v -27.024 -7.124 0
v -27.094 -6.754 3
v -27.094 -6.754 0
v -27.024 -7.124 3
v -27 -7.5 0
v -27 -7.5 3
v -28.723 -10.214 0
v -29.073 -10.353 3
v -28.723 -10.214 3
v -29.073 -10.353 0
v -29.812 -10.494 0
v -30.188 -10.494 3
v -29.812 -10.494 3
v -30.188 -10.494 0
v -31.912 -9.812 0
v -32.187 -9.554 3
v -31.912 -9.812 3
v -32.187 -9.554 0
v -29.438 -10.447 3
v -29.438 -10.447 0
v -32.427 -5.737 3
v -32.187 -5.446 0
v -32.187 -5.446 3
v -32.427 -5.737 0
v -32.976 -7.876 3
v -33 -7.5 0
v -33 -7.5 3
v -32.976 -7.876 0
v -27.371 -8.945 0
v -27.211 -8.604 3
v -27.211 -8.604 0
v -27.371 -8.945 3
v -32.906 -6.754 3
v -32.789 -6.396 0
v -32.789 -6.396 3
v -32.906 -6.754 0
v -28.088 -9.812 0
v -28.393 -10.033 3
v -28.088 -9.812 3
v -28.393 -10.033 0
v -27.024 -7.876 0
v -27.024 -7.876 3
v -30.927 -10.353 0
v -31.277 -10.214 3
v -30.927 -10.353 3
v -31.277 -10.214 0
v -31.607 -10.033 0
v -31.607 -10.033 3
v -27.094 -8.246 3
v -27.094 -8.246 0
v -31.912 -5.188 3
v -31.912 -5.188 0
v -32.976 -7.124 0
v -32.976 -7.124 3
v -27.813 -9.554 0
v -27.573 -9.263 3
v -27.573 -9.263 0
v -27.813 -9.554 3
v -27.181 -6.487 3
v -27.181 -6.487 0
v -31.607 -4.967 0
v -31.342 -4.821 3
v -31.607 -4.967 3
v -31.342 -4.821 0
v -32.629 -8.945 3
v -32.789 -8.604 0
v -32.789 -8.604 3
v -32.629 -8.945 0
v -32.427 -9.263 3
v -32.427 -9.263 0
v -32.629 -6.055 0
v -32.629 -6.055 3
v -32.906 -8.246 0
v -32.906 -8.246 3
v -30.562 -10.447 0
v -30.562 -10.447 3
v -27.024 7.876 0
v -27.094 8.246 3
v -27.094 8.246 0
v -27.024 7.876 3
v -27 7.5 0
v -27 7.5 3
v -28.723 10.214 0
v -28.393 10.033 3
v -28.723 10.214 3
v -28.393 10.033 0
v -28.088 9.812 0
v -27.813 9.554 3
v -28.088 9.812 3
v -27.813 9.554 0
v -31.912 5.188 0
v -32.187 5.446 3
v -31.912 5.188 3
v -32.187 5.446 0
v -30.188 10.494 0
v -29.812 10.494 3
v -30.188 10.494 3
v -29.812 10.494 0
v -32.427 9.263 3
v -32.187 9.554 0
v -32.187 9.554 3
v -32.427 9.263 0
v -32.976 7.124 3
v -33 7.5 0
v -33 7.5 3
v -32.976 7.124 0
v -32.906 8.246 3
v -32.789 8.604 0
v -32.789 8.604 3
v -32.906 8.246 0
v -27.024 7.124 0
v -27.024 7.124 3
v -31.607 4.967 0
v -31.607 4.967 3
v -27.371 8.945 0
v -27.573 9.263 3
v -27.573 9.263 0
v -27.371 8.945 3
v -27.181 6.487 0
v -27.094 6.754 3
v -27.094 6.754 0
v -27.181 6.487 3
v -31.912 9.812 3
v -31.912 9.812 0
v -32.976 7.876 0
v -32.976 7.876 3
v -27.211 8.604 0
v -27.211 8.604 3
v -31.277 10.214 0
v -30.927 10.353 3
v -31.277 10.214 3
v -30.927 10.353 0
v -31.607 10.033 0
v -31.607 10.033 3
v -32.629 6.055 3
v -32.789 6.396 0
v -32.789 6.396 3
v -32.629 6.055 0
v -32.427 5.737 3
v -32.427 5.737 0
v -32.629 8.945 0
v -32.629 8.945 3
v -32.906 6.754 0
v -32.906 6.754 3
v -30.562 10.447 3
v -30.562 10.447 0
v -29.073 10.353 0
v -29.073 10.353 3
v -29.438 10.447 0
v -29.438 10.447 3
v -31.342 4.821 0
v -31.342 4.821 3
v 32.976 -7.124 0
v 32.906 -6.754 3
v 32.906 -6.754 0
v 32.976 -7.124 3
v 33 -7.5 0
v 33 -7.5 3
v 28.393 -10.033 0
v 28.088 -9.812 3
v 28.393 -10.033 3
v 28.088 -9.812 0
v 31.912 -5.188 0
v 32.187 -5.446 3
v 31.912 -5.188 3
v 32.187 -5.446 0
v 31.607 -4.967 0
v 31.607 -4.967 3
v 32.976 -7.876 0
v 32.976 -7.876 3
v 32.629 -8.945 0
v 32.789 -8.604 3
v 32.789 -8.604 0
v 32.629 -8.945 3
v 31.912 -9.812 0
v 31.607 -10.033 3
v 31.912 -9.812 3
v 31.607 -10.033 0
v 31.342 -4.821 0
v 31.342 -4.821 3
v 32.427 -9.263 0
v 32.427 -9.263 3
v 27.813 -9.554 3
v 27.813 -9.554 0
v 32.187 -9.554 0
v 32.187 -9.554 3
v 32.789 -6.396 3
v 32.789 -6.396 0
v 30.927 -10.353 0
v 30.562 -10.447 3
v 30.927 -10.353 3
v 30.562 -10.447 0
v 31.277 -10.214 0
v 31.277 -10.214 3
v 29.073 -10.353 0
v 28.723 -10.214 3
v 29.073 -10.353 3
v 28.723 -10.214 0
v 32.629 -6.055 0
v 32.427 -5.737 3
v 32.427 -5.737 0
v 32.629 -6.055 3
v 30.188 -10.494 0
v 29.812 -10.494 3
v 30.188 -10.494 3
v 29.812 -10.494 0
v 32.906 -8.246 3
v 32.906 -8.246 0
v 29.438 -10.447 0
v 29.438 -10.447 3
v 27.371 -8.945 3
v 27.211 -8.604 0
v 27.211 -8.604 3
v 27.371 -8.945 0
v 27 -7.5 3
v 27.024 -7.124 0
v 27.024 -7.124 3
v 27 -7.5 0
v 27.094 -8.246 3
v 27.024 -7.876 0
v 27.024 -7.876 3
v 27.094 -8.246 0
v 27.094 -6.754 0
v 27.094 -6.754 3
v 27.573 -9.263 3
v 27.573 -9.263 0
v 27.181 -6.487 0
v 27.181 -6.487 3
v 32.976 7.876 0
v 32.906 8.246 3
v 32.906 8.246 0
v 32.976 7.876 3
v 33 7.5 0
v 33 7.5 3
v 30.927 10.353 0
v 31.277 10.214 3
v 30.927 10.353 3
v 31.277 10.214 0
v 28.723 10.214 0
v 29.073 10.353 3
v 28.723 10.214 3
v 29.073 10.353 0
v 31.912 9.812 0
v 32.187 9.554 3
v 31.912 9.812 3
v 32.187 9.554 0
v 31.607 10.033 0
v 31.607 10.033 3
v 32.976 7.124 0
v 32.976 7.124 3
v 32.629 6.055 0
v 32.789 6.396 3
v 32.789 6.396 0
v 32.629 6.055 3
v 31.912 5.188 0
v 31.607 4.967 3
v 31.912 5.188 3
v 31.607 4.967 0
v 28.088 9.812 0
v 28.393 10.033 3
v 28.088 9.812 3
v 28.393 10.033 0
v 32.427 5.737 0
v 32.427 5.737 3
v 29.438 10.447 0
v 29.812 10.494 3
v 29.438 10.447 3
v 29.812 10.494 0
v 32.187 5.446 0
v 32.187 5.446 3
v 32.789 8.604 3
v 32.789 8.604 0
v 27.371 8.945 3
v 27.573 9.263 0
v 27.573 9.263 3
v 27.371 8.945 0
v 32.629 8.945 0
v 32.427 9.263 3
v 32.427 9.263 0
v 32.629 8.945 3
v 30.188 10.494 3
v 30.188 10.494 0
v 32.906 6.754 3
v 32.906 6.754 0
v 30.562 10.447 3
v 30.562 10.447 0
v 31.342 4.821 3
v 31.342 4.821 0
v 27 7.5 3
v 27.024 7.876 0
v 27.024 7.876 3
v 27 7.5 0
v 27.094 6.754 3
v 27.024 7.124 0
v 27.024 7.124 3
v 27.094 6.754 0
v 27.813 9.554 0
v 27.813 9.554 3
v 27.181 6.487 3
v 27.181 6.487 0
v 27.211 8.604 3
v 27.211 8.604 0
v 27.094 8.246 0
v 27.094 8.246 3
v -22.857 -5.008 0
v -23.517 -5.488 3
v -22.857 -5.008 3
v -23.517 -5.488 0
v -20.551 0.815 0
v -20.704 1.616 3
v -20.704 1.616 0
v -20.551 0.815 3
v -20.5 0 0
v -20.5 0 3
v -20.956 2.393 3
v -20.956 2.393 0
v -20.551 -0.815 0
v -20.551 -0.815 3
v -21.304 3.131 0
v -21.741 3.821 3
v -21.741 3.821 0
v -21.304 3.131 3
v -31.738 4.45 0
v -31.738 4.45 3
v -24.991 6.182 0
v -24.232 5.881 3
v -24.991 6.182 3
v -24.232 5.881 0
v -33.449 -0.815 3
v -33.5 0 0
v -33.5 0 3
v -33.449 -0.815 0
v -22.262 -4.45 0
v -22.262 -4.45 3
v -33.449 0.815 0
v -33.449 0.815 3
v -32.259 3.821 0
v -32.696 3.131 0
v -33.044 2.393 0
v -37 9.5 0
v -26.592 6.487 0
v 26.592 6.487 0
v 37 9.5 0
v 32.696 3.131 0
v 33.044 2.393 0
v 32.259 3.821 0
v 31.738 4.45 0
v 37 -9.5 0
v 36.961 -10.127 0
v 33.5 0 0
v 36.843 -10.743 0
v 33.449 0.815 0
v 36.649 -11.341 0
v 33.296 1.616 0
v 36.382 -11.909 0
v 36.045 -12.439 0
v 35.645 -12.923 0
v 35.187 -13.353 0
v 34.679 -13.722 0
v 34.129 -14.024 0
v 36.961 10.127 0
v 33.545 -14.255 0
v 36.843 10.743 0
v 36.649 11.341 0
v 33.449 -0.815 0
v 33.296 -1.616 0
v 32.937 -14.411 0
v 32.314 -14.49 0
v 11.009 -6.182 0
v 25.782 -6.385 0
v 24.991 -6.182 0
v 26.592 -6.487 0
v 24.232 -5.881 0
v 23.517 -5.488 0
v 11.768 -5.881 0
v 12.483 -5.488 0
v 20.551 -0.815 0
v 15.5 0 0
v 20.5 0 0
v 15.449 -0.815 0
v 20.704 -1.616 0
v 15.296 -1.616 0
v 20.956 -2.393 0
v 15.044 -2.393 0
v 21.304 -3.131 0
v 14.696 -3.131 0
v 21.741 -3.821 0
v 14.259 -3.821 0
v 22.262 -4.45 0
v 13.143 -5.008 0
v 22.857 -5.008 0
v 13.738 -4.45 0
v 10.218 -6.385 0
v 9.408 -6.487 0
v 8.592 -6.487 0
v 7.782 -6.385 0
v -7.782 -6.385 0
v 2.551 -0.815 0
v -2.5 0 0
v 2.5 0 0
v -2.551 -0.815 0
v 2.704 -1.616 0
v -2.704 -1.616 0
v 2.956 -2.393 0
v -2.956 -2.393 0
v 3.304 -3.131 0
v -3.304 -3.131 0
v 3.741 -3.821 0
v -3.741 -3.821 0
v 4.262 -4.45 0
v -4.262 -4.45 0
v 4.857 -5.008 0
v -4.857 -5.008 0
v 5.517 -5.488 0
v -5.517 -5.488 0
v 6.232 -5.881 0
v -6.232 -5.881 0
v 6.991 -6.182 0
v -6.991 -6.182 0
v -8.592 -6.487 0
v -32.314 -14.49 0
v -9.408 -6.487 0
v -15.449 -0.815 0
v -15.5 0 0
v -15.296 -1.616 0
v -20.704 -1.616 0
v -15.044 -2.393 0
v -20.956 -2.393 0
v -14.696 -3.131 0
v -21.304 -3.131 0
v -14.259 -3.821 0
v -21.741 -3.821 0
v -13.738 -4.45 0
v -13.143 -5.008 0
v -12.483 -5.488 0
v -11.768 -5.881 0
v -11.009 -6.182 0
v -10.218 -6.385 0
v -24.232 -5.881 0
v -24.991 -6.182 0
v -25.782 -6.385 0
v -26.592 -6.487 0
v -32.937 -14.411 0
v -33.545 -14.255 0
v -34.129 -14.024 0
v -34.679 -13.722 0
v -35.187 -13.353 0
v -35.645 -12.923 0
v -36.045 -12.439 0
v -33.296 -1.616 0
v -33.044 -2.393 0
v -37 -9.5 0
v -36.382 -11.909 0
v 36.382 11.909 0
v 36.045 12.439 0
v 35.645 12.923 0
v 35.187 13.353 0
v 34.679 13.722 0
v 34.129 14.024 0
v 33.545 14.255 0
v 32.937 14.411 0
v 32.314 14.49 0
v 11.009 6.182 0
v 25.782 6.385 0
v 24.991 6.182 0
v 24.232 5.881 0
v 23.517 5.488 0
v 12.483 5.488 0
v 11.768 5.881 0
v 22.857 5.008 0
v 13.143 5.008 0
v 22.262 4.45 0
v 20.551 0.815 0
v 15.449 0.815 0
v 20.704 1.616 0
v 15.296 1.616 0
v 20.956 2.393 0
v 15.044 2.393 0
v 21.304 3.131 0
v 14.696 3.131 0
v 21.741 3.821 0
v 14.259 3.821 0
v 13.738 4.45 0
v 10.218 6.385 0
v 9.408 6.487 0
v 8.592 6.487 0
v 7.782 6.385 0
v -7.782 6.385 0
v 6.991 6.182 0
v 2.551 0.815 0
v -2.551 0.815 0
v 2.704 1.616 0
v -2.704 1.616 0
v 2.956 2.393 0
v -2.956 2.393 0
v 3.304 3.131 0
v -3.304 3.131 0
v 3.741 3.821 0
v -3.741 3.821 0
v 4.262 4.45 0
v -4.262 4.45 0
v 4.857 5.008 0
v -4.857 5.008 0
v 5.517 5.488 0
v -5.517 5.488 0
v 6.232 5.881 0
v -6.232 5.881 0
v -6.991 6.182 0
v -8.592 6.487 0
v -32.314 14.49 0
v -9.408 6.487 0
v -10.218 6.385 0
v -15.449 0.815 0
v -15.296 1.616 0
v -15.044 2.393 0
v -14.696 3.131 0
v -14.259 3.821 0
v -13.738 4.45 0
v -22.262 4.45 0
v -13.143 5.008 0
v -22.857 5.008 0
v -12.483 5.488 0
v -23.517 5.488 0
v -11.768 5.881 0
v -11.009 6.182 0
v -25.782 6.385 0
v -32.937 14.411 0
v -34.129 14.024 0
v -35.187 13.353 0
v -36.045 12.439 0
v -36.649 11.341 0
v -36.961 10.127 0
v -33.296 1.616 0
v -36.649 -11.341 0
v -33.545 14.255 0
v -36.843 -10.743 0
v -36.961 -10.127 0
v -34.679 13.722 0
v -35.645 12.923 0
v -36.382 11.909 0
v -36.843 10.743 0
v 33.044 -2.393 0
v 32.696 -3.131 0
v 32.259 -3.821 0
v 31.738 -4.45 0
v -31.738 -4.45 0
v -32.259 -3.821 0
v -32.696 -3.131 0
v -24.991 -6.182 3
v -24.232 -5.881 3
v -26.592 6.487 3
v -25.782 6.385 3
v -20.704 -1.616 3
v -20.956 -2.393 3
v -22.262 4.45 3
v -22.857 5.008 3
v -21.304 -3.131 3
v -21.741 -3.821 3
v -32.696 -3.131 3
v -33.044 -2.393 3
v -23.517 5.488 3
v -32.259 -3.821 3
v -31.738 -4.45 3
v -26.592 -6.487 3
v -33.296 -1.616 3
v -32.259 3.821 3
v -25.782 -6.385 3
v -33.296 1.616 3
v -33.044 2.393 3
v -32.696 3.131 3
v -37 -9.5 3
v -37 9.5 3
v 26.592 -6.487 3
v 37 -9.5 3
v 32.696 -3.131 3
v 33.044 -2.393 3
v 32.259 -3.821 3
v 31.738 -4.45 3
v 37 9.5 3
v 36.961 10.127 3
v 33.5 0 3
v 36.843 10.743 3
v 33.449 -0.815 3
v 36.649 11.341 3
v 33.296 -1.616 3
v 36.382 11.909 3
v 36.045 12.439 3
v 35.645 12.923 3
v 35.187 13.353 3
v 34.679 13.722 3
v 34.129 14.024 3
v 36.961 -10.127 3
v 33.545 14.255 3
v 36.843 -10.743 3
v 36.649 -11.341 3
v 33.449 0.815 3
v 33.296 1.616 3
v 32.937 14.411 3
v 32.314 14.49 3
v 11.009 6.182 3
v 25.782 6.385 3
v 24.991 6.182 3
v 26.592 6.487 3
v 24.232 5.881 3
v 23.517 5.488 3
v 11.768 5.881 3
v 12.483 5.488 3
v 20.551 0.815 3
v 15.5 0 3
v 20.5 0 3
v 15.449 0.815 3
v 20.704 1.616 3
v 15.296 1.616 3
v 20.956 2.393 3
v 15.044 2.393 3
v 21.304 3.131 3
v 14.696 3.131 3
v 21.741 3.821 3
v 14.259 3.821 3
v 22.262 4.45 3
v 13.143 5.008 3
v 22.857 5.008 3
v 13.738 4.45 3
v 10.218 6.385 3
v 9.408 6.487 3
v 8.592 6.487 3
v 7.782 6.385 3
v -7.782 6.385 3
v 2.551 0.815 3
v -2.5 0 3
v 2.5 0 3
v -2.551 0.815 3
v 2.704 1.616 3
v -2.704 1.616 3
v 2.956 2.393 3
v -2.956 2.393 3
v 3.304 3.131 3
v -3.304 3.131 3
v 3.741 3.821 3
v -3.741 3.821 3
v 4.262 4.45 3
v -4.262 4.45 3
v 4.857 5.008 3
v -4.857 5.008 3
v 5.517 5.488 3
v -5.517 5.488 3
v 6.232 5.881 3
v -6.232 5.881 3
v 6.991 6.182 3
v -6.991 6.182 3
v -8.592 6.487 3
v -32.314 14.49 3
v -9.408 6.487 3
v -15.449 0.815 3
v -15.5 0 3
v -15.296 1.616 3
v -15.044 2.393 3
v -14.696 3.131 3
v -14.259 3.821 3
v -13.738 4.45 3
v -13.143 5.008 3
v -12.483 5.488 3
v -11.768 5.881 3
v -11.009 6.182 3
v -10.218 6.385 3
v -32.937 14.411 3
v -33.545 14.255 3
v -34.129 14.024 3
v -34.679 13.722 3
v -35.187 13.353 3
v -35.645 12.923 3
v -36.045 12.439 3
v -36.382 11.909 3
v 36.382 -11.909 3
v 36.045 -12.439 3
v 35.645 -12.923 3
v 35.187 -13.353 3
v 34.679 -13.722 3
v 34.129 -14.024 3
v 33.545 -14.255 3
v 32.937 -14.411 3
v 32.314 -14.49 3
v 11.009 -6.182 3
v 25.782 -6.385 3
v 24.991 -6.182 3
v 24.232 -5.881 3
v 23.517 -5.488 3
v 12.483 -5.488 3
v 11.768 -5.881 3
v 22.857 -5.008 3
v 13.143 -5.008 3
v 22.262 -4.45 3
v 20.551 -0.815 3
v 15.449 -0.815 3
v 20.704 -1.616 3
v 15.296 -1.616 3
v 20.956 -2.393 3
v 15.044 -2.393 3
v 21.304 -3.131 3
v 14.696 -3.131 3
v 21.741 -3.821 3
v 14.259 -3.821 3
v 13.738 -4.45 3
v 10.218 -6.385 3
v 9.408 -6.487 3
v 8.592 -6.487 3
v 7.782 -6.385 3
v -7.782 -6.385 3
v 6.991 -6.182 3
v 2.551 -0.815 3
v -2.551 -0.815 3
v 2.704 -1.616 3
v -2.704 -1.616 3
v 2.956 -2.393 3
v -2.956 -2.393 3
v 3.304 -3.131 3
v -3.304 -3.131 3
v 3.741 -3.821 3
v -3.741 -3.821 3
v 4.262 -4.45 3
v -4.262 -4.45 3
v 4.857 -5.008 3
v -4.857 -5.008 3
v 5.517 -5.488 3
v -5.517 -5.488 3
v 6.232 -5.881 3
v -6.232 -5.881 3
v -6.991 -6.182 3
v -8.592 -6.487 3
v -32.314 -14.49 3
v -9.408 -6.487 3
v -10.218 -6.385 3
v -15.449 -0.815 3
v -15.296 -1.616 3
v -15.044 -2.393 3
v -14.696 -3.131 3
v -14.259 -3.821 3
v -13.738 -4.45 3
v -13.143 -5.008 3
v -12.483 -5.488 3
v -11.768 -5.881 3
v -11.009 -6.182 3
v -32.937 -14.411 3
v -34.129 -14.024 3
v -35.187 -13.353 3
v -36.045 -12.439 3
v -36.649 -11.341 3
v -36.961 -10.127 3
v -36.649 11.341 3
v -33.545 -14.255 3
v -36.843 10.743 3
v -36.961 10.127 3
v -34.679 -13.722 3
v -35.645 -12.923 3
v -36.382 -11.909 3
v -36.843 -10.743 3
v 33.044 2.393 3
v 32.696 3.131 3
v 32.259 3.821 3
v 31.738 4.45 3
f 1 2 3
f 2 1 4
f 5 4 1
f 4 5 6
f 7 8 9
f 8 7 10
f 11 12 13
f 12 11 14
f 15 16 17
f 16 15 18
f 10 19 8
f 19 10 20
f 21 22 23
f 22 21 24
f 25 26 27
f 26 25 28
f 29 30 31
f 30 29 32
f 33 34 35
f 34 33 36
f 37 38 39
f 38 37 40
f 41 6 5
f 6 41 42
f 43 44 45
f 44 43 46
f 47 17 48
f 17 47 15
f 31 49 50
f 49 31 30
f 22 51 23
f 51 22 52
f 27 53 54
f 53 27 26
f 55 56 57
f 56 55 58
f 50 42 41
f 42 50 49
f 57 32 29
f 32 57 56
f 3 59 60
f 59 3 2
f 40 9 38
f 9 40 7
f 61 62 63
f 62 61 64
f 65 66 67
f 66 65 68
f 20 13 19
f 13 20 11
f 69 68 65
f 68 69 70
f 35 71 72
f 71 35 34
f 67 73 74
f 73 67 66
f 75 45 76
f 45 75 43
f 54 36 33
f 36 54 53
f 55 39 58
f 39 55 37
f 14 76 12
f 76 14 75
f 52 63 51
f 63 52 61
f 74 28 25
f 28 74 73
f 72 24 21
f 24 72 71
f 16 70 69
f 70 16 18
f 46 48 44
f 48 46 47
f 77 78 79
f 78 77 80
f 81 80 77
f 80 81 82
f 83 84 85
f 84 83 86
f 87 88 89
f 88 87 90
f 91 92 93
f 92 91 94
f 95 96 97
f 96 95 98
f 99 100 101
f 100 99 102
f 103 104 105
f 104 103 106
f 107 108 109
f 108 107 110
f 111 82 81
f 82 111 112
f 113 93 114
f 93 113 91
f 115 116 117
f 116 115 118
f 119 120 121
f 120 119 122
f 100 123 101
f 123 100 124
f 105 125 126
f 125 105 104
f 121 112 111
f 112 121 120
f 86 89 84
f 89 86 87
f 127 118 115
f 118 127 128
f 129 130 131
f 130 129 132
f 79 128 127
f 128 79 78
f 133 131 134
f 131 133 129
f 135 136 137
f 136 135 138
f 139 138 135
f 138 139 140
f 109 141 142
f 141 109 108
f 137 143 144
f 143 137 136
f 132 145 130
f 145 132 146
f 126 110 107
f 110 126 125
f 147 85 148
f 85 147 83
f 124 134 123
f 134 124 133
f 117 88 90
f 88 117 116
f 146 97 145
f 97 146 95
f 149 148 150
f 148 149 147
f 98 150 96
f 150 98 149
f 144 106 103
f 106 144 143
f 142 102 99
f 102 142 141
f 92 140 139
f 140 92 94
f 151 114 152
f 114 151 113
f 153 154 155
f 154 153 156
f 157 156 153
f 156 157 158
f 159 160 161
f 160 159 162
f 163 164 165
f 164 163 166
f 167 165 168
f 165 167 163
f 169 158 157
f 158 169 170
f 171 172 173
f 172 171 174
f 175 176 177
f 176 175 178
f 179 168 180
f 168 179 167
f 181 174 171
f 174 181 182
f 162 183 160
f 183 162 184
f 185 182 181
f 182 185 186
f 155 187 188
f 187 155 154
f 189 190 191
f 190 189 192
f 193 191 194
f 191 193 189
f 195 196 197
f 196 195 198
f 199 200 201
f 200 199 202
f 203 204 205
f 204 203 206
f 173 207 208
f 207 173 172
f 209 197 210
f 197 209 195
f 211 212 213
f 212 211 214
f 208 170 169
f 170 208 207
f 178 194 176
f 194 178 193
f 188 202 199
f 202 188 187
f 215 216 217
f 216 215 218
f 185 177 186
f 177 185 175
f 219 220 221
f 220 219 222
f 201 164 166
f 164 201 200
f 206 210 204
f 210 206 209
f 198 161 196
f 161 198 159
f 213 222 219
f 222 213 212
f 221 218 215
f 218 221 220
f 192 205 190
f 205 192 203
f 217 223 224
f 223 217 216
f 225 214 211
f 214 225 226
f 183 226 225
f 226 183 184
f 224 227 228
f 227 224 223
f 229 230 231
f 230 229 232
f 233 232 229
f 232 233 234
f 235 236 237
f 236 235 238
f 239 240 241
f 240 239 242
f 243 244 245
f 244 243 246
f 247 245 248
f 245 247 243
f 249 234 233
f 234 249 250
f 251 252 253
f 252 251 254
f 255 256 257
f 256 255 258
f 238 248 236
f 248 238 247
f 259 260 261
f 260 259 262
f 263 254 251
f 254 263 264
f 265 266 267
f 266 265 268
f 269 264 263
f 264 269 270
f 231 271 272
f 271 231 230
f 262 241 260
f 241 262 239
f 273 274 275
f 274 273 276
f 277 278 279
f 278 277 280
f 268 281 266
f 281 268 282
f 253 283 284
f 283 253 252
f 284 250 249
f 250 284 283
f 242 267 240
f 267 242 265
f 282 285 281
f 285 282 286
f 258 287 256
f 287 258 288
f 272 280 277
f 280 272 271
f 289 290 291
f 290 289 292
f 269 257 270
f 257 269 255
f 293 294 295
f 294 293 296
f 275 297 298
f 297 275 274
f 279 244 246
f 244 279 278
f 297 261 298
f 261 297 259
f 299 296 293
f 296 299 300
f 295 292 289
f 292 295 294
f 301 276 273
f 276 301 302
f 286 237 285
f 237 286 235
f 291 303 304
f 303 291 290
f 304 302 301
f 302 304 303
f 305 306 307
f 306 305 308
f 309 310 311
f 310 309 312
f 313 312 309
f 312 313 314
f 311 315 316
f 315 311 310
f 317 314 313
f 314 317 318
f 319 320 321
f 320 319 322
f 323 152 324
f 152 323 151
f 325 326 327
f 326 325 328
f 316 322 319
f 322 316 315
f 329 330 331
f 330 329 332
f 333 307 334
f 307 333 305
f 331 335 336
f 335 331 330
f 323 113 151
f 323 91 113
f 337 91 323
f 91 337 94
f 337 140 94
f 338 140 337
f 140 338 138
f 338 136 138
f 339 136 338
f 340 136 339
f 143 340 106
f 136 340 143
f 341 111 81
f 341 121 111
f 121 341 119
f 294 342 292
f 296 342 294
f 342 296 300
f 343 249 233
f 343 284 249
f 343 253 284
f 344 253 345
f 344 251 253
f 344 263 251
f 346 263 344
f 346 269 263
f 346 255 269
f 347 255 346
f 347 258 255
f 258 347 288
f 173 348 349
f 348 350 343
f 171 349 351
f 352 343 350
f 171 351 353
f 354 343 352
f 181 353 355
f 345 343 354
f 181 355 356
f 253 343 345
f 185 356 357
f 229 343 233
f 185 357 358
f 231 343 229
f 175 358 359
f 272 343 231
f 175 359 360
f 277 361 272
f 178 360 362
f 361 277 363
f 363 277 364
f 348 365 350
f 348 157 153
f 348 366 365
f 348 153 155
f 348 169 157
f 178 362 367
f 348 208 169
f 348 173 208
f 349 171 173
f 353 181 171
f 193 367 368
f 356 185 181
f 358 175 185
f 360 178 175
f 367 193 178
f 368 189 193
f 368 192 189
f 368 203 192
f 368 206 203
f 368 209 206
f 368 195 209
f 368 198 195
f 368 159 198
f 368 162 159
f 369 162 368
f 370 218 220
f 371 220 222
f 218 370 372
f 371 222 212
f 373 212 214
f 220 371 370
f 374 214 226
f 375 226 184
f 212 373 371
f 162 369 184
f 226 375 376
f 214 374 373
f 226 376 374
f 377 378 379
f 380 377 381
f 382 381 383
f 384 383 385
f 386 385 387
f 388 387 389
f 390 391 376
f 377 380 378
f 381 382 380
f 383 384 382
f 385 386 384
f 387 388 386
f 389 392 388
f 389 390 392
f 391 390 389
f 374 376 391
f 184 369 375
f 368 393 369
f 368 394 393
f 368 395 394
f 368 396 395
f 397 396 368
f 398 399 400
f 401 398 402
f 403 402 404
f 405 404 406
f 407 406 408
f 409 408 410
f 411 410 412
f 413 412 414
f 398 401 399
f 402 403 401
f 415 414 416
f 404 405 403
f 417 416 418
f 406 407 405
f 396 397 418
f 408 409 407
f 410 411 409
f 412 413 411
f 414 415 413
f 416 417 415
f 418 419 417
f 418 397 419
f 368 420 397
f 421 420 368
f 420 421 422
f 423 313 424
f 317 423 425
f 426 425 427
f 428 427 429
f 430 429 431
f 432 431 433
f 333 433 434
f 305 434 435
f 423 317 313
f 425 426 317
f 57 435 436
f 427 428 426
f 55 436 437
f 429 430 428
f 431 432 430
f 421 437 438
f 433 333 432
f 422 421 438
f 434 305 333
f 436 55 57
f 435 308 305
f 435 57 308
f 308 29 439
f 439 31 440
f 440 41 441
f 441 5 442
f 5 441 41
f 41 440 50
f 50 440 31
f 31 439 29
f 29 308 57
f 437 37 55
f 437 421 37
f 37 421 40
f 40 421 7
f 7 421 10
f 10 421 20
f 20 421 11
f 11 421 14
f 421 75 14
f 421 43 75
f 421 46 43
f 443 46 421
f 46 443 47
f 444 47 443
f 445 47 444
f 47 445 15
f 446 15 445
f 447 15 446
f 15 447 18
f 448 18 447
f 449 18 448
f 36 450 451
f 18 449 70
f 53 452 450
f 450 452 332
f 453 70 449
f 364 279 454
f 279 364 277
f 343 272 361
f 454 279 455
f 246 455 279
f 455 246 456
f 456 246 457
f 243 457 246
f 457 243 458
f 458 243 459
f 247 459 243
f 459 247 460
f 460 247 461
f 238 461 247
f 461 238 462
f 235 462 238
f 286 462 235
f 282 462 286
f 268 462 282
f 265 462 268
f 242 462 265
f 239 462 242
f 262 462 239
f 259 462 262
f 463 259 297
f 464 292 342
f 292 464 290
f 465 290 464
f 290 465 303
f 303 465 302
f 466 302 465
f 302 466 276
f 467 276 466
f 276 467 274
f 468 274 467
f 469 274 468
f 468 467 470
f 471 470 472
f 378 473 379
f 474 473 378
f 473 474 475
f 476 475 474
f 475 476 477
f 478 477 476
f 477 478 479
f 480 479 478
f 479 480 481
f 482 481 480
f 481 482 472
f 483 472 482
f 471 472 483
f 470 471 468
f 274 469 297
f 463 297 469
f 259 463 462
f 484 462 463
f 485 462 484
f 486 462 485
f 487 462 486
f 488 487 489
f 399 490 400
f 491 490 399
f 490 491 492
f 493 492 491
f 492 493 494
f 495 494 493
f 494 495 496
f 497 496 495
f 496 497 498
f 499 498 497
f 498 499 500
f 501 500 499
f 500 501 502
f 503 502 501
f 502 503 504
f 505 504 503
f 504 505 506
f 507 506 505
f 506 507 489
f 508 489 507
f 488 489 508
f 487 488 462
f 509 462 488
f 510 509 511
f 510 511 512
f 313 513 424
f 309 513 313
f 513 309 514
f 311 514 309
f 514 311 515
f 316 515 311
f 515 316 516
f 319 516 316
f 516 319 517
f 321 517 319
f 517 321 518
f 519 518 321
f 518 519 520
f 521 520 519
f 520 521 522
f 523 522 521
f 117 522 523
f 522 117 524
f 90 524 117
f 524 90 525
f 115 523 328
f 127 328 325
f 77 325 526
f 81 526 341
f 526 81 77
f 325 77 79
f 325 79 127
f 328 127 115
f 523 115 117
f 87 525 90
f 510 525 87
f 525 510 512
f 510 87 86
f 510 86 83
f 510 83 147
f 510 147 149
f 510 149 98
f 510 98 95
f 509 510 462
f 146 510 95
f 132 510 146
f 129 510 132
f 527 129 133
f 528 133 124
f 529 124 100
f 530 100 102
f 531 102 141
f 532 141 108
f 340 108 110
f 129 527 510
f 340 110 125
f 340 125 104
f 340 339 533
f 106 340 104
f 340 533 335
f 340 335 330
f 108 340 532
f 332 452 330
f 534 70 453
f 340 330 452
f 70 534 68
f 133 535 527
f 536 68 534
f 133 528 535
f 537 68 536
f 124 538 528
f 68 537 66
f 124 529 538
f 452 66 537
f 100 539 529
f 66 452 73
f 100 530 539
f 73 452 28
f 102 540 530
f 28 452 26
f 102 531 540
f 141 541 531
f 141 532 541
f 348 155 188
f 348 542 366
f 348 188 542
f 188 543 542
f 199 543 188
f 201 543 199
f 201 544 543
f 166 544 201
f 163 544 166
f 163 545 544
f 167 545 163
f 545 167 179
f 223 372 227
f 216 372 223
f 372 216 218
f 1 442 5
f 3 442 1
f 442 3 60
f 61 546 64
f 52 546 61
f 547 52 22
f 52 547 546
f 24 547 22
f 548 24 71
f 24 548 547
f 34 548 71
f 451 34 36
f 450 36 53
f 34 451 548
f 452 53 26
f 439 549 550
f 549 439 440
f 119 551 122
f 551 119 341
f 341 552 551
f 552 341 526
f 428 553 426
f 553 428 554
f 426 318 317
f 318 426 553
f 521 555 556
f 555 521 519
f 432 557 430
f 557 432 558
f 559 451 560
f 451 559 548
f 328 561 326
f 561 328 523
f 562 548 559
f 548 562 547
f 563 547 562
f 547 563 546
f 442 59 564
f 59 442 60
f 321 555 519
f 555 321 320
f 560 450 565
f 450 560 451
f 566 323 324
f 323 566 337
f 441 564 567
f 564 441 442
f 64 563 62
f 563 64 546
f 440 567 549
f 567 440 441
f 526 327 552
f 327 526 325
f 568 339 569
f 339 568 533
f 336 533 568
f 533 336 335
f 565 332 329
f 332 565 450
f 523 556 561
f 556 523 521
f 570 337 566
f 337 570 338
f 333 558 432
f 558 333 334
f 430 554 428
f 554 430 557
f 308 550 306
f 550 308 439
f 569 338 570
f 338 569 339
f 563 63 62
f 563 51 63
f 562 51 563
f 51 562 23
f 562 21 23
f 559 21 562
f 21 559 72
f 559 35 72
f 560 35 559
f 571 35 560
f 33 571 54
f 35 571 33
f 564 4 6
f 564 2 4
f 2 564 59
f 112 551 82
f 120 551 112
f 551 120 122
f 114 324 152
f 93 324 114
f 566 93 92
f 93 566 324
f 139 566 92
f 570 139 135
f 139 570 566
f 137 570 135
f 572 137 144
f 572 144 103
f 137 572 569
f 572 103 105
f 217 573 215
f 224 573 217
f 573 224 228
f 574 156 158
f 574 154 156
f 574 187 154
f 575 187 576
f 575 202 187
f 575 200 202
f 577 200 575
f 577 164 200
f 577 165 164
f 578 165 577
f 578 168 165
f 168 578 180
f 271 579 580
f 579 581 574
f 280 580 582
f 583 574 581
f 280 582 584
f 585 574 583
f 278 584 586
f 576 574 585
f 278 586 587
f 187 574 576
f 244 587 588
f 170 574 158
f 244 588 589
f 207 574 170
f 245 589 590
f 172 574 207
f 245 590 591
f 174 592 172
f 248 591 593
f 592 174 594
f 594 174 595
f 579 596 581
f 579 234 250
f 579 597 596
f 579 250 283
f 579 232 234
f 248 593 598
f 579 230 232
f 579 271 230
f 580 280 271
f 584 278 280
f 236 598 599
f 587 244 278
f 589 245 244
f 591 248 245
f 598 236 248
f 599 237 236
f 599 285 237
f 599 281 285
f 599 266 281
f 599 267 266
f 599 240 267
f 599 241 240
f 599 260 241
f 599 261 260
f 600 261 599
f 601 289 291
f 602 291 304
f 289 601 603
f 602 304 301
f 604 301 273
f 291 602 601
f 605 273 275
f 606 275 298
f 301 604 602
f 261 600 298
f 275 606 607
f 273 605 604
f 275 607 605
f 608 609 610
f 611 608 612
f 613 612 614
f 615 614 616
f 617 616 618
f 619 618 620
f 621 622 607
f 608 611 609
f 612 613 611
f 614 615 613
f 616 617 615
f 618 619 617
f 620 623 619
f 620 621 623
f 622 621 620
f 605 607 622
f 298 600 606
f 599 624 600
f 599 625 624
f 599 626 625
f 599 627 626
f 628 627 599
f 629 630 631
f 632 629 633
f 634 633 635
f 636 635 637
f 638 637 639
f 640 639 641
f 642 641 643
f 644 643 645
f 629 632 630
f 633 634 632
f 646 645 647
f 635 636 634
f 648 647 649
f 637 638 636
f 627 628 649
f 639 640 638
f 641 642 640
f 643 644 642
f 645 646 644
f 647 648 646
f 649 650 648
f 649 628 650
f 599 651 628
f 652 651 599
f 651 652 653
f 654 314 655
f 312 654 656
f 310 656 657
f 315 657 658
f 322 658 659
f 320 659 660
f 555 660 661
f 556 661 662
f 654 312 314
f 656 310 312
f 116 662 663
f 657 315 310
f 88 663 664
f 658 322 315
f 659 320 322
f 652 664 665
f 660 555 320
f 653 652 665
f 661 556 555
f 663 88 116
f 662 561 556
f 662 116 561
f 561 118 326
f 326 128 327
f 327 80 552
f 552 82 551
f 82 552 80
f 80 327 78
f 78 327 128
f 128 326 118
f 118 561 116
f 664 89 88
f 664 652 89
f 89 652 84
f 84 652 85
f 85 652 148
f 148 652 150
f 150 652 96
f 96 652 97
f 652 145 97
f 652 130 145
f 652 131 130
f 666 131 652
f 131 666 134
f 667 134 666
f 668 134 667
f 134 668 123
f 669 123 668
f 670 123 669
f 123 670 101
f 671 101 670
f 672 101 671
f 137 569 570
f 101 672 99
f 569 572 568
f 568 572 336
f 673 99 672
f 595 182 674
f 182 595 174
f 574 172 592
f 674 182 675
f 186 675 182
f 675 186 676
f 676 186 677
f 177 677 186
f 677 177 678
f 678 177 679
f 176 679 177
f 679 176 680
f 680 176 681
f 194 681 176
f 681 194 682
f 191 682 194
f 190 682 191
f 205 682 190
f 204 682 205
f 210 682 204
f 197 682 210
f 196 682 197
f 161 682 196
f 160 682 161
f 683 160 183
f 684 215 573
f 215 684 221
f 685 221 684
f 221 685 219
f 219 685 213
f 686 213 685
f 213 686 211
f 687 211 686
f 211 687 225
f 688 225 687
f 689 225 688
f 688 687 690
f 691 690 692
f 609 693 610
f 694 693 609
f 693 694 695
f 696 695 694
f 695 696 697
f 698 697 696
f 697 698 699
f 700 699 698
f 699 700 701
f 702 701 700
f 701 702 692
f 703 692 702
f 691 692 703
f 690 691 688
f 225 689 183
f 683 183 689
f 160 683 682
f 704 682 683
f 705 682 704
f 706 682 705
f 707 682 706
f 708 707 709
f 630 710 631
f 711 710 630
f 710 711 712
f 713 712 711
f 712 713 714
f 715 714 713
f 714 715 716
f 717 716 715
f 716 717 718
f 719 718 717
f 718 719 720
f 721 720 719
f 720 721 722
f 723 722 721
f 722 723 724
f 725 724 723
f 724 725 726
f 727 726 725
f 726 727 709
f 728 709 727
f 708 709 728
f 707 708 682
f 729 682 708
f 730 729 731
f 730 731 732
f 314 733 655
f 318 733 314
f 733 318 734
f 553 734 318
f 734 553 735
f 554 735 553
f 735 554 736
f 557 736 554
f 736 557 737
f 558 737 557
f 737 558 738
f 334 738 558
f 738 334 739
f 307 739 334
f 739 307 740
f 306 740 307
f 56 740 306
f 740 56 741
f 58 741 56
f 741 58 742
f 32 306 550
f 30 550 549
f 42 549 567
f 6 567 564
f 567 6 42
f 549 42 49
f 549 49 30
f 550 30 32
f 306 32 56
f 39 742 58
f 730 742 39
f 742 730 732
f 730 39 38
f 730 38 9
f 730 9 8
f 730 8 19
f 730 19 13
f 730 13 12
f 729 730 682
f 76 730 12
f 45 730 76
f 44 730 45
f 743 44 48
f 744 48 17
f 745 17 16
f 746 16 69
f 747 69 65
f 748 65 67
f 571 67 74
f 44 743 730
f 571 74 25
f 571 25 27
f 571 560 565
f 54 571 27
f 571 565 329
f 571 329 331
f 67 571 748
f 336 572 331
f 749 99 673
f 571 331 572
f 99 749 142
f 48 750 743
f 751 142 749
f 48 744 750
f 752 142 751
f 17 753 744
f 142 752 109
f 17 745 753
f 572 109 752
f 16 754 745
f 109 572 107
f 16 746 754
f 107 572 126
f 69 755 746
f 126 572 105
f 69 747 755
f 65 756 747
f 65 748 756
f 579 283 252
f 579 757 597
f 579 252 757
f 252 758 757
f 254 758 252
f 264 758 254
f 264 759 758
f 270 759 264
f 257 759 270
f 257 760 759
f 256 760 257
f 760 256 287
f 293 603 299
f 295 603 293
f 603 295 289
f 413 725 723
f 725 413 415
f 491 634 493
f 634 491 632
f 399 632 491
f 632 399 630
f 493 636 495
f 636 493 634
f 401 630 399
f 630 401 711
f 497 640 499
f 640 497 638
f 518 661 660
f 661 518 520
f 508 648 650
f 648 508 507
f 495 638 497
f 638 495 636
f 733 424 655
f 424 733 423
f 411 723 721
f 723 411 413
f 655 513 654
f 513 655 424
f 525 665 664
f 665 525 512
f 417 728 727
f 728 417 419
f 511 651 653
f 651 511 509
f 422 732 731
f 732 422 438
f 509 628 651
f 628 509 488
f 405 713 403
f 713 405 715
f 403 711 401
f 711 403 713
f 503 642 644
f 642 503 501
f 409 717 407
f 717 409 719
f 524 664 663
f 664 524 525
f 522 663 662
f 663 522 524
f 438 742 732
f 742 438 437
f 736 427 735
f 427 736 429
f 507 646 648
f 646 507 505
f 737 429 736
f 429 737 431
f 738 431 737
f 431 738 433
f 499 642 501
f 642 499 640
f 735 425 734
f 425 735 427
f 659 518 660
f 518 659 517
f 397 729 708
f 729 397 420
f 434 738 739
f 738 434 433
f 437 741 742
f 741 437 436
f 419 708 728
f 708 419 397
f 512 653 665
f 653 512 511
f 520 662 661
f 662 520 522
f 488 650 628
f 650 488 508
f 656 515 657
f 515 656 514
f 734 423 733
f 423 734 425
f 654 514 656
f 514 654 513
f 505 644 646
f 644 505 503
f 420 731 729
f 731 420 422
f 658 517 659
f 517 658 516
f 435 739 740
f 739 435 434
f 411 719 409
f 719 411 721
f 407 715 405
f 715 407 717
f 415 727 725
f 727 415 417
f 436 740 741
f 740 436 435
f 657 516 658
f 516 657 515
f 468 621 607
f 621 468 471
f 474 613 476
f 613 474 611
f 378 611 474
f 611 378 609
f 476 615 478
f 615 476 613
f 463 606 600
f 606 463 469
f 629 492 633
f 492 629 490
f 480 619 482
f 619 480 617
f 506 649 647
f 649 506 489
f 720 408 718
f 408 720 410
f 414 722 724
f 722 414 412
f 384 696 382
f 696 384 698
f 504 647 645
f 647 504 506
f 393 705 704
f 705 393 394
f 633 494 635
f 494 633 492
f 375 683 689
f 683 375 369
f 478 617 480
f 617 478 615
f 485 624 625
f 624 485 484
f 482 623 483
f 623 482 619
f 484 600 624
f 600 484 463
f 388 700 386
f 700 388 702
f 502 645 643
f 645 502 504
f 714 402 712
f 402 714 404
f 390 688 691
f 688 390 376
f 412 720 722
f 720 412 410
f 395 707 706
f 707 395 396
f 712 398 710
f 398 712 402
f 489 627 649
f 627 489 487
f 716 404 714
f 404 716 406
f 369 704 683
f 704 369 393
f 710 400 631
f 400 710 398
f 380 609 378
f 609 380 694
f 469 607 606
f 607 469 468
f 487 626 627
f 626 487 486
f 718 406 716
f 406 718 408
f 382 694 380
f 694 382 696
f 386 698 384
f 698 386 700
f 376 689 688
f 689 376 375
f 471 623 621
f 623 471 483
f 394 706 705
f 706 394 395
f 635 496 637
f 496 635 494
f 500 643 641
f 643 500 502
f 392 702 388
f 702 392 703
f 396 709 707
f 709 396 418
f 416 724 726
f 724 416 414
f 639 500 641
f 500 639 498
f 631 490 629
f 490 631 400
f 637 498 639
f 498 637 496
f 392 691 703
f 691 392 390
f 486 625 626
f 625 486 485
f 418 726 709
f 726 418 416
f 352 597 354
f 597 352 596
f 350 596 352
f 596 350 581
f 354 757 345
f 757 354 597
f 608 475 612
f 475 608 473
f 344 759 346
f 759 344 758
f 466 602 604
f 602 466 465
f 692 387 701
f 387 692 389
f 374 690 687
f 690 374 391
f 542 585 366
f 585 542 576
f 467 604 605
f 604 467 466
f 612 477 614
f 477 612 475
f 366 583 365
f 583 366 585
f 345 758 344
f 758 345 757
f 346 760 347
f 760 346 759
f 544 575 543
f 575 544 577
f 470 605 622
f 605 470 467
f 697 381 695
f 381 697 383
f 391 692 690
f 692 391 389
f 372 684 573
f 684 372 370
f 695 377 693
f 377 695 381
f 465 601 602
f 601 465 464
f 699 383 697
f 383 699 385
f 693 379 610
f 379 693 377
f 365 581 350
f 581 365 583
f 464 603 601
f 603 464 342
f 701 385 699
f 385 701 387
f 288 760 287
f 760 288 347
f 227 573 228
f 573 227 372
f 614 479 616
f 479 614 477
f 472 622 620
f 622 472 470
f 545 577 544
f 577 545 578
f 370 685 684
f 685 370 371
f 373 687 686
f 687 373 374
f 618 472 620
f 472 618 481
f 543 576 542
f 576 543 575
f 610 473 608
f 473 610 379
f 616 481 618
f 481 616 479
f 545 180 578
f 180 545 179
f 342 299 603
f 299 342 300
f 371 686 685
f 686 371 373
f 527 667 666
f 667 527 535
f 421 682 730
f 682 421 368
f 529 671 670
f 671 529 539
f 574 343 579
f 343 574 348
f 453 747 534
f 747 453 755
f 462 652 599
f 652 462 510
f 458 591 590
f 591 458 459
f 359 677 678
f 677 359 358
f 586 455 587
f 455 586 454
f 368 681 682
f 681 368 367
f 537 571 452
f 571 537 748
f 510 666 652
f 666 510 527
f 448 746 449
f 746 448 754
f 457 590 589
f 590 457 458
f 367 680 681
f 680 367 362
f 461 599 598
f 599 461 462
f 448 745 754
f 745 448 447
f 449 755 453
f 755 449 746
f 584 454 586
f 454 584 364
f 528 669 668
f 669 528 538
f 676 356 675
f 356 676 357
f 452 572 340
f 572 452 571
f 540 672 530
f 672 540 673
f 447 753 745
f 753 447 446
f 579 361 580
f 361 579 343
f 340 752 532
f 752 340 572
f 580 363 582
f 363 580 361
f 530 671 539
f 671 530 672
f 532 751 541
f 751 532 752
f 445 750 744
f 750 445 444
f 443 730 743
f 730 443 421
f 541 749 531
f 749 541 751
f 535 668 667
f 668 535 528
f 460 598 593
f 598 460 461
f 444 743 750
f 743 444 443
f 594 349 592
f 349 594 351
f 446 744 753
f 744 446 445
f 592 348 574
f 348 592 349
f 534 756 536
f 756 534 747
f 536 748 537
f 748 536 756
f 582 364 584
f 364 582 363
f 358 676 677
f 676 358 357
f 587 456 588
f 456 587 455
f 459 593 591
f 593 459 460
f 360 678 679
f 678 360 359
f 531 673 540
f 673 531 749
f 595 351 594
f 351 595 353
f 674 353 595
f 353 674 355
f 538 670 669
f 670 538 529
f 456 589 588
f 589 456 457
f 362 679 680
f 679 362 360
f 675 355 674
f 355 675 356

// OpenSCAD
$fn = 50;


difference() {
	union() {
		hull() {
			translate(v = [-32.0000000000, 9.5000000000, 0]) {
				cylinder(h = 3, r = 5);
			}
			translate(v = [32.0000000000, 9.5000000000, 0]) {
				cylinder(h = 3, r = 5);
			}
			translate(v = [-32.0000000000, -9.5000000000, 0]) {
				cylinder(h = 3, r = 5);
			}
			translate(v = [32.0000000000, -9.5000000000, 0]) {
				cylinder(h = 3, r = 5);
			}
		}
	}
	union() {
		#translate(v = [-30.0000000000, -7.5000000000, -100.0000000000]) {
			cylinder(h = 200, r = 3.0000000000);
		}
		#translate(v = [-30.0000000000, 7.5000000000, -100.0000000000]) {
			cylinder(h = 200, r = 3.0000000000);
		}
		#translate(v = [30.0000000000, -7.5000000000, -100.0000000000]) {
			cylinder(h = 200, r = 3.0000000000);
		}
		#translate(v = [30.0000000000, 7.5000000000, -100.0000000000]) {
			cylinder(h = 200, r = 3.0000000000);
		}
		#translate(v = [-27.0000000000, 0, 0]) {
			cylinder(h = 3, r = 6.5000000000);
		}
		#translate(v = [-9.0000000000, 0, 0]) {
			cylinder(h = 3, r = 6.5000000000);
		}
		#translate(v = [9.0000000000, 0, 0]) {
			cylinder(h = 3, r = 6.5000000000);
		}
		#translate(v = [27.0000000000, 0, 0]) {
			cylinder(h = 3, r = 6.5000000000);
		}
	}
}
